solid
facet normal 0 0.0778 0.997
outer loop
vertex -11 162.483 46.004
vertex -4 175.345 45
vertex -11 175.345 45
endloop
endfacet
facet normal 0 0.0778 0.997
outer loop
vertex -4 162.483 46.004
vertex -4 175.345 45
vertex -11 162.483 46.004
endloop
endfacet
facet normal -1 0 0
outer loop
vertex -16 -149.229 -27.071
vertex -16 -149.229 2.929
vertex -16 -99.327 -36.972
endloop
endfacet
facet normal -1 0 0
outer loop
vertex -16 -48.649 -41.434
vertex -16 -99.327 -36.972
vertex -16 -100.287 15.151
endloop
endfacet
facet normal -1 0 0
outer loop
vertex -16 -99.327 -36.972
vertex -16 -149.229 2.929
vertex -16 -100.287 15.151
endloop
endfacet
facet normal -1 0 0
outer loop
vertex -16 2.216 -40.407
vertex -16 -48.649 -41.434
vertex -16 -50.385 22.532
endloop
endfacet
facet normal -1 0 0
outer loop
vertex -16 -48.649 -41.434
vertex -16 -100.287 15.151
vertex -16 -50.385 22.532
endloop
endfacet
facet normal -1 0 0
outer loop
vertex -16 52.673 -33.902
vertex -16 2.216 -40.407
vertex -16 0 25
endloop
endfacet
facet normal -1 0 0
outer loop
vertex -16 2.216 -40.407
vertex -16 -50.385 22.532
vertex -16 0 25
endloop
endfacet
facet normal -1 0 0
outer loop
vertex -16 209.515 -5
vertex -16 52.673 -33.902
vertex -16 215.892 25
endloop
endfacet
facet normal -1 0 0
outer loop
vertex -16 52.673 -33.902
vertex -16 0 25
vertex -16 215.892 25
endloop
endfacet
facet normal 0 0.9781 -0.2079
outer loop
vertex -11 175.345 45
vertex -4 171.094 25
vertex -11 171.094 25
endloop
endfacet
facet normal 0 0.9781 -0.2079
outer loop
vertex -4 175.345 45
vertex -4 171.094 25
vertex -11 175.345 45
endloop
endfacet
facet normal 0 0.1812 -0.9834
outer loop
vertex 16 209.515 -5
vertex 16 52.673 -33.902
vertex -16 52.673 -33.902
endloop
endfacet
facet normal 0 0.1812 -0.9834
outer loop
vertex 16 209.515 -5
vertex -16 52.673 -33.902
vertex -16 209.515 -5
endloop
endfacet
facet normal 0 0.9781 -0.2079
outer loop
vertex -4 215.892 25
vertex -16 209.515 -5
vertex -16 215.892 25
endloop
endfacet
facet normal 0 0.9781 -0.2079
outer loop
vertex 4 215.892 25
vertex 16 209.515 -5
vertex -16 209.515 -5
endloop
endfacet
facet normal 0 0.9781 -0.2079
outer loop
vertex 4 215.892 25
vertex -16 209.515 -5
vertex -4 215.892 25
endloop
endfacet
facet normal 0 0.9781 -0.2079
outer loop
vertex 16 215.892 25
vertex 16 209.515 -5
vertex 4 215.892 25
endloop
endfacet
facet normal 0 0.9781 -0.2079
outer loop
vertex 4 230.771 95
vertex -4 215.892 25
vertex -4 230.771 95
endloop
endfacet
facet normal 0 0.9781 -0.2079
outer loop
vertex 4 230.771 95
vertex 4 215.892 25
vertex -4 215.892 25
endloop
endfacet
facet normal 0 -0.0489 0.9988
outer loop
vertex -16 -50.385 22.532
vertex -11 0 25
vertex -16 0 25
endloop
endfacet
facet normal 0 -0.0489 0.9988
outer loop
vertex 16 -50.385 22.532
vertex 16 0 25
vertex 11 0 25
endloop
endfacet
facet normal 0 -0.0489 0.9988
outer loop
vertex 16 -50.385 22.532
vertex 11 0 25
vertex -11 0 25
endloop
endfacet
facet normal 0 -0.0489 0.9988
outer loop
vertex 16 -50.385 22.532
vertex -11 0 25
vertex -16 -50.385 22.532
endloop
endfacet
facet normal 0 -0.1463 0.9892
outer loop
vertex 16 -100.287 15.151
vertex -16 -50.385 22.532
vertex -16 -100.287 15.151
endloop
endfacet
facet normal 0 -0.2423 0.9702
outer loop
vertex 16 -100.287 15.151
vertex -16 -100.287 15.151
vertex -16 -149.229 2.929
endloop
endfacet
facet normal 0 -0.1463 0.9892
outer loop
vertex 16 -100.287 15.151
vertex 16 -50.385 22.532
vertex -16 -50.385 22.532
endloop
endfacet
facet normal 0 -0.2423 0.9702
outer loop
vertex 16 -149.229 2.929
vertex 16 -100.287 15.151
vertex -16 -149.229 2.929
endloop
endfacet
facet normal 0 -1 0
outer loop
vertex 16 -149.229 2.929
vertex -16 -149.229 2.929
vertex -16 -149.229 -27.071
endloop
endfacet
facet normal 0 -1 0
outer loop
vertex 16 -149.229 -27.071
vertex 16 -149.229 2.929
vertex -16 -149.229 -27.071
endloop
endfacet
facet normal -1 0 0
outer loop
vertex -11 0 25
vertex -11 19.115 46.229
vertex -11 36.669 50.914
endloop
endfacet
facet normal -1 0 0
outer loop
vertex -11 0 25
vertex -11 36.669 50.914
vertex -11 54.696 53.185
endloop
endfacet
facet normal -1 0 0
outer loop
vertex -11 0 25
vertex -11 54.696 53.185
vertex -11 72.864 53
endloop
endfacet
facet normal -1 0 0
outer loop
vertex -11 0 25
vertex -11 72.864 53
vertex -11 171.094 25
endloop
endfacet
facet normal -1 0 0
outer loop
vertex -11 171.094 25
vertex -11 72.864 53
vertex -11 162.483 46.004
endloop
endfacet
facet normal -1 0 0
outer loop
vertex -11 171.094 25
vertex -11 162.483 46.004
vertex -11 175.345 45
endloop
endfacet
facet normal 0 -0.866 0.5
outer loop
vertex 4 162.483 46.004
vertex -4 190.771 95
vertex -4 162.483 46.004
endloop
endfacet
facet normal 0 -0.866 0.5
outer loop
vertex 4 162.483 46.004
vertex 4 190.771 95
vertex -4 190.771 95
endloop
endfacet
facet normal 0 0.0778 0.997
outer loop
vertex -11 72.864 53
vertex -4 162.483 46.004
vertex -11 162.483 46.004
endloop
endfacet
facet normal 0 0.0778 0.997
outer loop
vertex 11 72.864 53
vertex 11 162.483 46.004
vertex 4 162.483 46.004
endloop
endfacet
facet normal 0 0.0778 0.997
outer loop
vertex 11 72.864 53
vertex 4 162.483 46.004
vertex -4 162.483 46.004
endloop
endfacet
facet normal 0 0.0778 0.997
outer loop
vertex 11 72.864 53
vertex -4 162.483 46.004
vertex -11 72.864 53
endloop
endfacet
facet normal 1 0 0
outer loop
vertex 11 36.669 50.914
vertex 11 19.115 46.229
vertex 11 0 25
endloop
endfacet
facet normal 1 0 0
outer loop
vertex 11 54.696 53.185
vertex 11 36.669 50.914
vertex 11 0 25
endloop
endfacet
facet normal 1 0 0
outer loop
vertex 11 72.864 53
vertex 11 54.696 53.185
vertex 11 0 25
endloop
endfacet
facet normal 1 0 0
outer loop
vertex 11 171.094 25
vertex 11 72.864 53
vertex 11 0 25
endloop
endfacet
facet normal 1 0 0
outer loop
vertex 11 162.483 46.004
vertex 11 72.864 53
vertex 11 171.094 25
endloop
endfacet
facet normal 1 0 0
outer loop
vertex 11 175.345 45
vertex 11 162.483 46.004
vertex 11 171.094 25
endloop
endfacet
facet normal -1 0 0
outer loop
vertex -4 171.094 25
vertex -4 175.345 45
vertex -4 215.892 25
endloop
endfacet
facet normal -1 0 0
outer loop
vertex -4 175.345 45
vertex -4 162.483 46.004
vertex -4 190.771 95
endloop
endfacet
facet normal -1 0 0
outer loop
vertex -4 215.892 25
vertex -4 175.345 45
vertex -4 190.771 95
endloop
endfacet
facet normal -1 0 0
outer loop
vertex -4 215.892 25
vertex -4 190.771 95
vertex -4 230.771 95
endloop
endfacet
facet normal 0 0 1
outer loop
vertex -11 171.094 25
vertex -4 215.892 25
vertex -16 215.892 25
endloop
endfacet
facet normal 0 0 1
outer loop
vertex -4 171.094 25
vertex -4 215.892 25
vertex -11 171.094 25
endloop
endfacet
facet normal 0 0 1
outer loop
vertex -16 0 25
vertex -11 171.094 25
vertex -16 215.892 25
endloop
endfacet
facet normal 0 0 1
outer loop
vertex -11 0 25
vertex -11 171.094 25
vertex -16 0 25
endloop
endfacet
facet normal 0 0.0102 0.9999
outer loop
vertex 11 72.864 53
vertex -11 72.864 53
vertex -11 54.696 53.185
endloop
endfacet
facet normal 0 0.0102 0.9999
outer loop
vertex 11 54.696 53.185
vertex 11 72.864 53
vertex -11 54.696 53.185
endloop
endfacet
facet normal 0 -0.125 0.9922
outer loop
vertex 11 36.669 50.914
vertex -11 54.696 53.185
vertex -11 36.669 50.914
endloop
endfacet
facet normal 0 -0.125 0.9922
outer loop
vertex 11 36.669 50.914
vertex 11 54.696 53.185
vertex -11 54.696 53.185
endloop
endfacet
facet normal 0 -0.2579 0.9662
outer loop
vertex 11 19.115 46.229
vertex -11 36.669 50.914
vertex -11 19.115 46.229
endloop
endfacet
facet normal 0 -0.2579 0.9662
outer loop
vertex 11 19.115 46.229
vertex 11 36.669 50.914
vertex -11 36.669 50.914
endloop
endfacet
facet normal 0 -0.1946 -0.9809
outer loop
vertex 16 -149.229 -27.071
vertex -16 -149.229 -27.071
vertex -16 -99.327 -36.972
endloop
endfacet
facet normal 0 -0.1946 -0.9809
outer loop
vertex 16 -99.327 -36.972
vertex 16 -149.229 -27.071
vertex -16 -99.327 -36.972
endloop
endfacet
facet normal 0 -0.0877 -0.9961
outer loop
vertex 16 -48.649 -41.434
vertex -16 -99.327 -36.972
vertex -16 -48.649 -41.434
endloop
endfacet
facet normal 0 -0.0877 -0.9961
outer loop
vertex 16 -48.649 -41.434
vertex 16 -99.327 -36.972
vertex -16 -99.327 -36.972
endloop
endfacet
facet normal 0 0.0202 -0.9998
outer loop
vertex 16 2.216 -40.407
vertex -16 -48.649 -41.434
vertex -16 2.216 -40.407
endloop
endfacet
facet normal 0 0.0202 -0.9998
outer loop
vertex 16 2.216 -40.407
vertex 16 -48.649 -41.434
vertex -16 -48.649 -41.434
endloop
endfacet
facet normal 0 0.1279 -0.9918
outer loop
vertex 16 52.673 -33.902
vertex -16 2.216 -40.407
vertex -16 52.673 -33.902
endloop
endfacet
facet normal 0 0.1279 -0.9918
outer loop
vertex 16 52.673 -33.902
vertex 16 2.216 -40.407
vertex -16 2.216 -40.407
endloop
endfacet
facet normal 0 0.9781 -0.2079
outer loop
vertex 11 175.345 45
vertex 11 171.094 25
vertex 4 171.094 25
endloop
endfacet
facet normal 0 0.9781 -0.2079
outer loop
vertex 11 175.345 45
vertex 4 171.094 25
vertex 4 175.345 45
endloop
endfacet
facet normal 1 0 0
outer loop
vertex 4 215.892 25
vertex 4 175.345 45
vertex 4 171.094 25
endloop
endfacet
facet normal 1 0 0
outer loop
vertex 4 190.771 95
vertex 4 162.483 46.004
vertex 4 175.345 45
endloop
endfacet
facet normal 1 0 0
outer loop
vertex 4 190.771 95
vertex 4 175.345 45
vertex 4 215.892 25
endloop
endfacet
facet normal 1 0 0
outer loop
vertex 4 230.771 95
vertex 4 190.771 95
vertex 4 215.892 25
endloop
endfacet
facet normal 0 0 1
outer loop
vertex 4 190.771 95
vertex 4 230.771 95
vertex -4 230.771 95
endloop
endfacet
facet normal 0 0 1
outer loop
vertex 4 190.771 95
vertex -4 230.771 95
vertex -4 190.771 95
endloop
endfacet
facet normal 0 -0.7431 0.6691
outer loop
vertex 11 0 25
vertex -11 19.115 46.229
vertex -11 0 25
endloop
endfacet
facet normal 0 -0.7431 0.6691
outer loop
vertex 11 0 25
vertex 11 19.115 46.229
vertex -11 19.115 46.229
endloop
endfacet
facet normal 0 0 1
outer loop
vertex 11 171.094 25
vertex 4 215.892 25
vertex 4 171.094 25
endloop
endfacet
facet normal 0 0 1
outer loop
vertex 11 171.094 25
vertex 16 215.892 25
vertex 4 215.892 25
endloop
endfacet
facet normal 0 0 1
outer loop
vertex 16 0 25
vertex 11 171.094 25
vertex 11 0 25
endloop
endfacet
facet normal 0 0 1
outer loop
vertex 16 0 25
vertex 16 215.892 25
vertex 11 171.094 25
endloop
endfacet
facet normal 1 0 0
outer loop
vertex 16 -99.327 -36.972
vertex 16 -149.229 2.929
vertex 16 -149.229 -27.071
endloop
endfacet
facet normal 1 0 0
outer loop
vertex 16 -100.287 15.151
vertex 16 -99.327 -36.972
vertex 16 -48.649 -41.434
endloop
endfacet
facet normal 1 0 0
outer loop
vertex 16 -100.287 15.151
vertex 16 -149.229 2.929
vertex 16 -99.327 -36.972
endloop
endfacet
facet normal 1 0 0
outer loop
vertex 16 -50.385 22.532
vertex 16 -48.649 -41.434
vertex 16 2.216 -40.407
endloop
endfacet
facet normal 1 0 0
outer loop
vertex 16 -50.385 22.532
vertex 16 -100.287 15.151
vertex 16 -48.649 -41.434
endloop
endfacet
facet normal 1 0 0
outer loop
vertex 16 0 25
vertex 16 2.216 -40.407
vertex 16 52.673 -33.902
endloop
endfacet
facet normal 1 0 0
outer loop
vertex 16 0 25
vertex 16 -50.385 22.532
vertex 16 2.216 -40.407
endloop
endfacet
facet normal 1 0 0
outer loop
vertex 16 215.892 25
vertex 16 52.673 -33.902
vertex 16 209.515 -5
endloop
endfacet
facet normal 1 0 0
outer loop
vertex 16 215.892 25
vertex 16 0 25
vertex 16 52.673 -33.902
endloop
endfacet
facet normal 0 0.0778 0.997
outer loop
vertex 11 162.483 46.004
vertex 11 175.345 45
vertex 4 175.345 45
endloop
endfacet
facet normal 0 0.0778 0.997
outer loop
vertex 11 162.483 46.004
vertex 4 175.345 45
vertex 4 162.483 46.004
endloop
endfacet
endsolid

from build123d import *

# Parameters (mm, degrees)
F2_DEPTH = 16
F3_DEPTH = 4
F4_DEPTH = 11


with BuildPart() as f2:
    # F1 (on Right) → F2 (new body, symmetric)
    with BuildSketch(Plane.YZ):
        with BuildLine():
            Line((150.3560738462, 25), (0, 25))
            ThreePointArc((0, 25), (-75.426387367, 19.4523172703), (-149.2294073105, 2.9286693037))
            Line((-149.2294073105, 2.9286693037), (-149.2294073105, 0))
            Line((-149.2294073105, 0), (-149.2294073105, -27.0713306963))
            ThreePointArc((-149.2294073105, -27.0713306963), (-48.6487574396, -41.4344679398), (52.6726568851, -33.9020155382))
            Line((52.6726568851, -33.9020155382), (209.5149365225, -5))
            Line((209.5149365225, -5), (215.8916333726, 25))
            Line((215.8916333726, 25), (171.0938662291, 25))
            Line((171.0938662291, 25), (150.3560738462, 25))
        make_face()
    extrude(amount=F2_DEPTH, both=True)

    # F1 (on Right) → F3 (join, symmetric)
    with BuildSketch(Plane.YZ):
        Polygon((175.3449974625, 45), (171.0938662291, 25), (215.8916333726, 25), (230.7705926895, 95), (190.7705926895, 95), (162.4827761164, 46.0040644602), align=None)
    extrude(amount=F3_DEPTH, both=True)

    # F1 (on Right) → F4 (join, symmetric)
    with BuildSketch(Plane.YZ):
        Polygon((162.4827761164, 46.0040644602), (150.3560738462, 25), (171.0938662291, 25), (175.3449974625, 45), align=None)
        with BuildLine():
            Line((19.114555791, 46.2288648769), (0, 25))
            Line((0, 25), (150.3560738462, 25))
            Line((150.3560738462, 25), (162.4827761164, 46.0040644602))
            Line((162.4827761164, 46.0040644602), (72.8637576103, 53))
            ThreePointArc((72.8637576103, 53), (45.6439579452, 52.3546166529), (19.114555791, 46.2288648769))
        make_face()
    extrude(amount=F4_DEPTH, both=True)


solid = f2.part
